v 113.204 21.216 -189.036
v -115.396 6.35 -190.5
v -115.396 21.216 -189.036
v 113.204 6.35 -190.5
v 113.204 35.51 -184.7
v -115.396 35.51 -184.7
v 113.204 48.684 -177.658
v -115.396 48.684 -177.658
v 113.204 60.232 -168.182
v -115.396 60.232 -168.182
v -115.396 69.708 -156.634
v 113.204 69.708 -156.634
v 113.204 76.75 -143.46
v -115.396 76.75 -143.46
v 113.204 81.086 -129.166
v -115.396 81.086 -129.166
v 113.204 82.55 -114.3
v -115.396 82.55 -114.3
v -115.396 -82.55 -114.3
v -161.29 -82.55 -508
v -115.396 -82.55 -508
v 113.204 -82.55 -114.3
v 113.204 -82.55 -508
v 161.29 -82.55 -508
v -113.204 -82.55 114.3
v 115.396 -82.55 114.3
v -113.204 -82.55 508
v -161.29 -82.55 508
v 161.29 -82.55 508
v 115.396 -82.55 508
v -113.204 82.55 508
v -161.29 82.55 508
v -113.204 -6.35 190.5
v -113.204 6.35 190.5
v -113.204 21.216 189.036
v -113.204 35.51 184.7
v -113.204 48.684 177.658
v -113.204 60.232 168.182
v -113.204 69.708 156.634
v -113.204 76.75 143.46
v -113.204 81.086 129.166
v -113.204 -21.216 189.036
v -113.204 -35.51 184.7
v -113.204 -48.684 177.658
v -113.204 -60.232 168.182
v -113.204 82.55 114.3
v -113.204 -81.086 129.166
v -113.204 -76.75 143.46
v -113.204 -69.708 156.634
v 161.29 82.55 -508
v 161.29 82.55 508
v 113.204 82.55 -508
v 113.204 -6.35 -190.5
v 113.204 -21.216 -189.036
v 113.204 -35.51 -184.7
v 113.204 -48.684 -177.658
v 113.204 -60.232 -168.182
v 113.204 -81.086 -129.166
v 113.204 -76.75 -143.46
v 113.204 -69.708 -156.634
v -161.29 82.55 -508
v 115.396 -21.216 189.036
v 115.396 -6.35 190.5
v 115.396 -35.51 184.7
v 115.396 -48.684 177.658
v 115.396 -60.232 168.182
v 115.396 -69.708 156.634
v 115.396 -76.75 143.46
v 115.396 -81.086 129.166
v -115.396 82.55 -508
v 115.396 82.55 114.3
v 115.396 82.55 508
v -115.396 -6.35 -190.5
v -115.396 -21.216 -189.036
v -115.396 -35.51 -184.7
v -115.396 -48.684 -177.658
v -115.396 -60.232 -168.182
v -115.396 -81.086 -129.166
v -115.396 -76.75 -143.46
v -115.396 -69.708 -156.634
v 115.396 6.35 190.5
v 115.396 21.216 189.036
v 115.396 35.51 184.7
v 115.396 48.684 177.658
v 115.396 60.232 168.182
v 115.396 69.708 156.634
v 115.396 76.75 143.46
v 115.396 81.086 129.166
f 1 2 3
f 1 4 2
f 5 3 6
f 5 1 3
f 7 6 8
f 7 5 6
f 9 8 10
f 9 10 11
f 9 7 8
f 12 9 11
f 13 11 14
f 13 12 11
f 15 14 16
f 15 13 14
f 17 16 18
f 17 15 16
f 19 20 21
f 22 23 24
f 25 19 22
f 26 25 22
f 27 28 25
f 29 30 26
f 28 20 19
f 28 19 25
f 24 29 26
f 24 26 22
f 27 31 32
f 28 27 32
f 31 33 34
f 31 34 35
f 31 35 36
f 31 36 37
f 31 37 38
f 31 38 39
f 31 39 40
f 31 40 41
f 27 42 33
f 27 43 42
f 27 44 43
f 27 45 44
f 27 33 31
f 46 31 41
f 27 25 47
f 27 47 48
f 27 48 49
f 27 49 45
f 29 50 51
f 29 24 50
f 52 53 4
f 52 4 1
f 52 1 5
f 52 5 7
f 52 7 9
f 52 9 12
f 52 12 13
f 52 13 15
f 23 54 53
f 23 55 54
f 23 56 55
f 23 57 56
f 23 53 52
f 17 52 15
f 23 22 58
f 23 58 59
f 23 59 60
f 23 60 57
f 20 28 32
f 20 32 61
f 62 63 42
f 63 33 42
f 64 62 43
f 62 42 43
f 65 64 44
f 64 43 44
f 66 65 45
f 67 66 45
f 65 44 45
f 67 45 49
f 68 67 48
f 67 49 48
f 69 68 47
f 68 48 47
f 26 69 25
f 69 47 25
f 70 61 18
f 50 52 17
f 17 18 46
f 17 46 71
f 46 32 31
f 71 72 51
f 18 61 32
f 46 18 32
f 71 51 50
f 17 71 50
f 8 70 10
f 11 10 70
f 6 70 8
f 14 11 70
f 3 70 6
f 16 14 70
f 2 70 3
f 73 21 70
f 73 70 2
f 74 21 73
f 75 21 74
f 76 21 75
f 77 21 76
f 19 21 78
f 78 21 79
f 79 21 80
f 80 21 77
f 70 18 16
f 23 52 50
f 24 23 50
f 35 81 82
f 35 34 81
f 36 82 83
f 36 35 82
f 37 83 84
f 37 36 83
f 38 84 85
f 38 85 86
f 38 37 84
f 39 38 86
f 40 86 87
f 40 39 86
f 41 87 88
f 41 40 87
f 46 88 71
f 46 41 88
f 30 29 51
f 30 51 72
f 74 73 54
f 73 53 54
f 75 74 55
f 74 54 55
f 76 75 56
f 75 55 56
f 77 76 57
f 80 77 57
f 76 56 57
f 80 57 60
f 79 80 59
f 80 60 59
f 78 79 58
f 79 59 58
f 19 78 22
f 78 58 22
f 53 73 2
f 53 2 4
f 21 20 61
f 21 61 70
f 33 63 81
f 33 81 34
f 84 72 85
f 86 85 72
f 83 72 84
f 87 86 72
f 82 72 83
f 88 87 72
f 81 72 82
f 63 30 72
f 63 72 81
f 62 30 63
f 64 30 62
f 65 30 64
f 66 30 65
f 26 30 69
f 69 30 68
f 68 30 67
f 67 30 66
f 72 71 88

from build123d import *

# Parameters (mm, degrees)
F1_DEPTH = 82.55
F2_R     = 76.2


with BuildPart() as f1:
    # F0 (on Front) → F1 (new body, symmetric)
    with BuildSketch(Plane.XZ):
        Polygon((161.29, -508), (161.29, 508), (115.3964, 508), (115.3964, 190.5), (0, 190.5), (-113.2036, 190.5), (-113.2036, 508), (-161.29, 508), (-161.29, -508), (-115.3964, -508), (-115.3964, -190.5), (0, -190.5), (113.2036, -190.5), (113.2036, -508), align=None)
    extrude(amount=F1_DEPTH, both=True)

    # F2
    f2_edges = [f1.edges().sort_by_distance(p)[0] for p in [
        (1.0964, -82.55, 190.5),
        (1.0964, 82.55, 190.5),
        (-1.0964, 82.55, -190.5),
        (-1.0964, -82.55, -190.5),
    ]]
    fillet(f2_edges, radius=F2_R)


solid = f1.part
